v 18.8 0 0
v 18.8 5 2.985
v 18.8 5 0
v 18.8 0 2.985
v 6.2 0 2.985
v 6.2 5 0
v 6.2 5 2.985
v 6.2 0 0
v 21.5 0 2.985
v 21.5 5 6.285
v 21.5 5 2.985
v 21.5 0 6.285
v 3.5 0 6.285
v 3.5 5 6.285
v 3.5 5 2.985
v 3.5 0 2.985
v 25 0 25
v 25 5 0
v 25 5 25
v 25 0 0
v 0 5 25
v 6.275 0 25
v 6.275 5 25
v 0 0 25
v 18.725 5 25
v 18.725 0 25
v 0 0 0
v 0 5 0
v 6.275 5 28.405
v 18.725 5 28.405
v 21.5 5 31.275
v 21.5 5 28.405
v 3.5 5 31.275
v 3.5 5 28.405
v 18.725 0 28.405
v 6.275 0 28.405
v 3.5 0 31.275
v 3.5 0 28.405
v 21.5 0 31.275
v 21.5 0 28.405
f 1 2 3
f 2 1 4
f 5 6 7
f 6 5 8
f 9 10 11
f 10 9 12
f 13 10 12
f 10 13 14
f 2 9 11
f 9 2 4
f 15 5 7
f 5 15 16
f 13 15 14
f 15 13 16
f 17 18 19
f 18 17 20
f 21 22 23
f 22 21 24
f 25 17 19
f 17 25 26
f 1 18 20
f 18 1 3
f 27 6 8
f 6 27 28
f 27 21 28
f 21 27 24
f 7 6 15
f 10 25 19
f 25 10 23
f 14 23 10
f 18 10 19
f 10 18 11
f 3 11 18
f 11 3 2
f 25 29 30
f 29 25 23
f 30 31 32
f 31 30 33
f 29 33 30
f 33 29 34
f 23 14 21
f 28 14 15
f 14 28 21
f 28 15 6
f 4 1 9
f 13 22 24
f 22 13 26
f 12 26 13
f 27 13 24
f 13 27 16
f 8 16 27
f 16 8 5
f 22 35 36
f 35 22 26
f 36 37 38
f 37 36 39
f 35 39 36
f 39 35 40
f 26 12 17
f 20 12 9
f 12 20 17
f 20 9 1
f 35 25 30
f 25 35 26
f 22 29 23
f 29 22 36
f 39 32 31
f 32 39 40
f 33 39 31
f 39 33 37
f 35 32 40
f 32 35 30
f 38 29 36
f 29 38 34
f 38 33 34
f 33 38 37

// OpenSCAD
//Rail build 2

rail_top_w=18;
rail_top_h=2.87;
rail_grove_w=12.45;
rail_grove_h=3.42;

slot_top_w=18;
slot_top_h=3.3;
slot_grove_w=12.6;
slot_grove_h=3;

length=5;
cube_size=25;

module createRail ( my_length ) {
	translate([0,my_length/2,0]) {
		translate([0,0,rail_grove_h/2+0.015])  color("Red")
			cube([rail_grove_w,my_length,rail_grove_h+0.01], center=true);
		translate([0,0,rail_grove_h+rail_top_h/2])
			cube([rail_top_w,my_length,rail_top_h],center=true);
	}
}


module creatSlot ( my_length ) {
	my_length=my_length+0.001;
	translate([0,(my_length-0.0005)/2,0]) {
		translate([0,0,slot_grove_h/2+0.015])  color("Red")
			cube([slot_grove_w,my_length,slot_grove_h+0.01], center=true);
		translate([0,0,slot_grove_h+slot_top_h/2])
			cube([slot_top_w,my_length,slot_top_h],center=true);
	}
	
}

difference(){
	cube ([cube_size,length,cube_size]);
	translate([cube_size/2,0,-0.015])
		creatSlot(20);
}
translate([cube_size/2,0,cube_size-0.015])
	createRail (length);
